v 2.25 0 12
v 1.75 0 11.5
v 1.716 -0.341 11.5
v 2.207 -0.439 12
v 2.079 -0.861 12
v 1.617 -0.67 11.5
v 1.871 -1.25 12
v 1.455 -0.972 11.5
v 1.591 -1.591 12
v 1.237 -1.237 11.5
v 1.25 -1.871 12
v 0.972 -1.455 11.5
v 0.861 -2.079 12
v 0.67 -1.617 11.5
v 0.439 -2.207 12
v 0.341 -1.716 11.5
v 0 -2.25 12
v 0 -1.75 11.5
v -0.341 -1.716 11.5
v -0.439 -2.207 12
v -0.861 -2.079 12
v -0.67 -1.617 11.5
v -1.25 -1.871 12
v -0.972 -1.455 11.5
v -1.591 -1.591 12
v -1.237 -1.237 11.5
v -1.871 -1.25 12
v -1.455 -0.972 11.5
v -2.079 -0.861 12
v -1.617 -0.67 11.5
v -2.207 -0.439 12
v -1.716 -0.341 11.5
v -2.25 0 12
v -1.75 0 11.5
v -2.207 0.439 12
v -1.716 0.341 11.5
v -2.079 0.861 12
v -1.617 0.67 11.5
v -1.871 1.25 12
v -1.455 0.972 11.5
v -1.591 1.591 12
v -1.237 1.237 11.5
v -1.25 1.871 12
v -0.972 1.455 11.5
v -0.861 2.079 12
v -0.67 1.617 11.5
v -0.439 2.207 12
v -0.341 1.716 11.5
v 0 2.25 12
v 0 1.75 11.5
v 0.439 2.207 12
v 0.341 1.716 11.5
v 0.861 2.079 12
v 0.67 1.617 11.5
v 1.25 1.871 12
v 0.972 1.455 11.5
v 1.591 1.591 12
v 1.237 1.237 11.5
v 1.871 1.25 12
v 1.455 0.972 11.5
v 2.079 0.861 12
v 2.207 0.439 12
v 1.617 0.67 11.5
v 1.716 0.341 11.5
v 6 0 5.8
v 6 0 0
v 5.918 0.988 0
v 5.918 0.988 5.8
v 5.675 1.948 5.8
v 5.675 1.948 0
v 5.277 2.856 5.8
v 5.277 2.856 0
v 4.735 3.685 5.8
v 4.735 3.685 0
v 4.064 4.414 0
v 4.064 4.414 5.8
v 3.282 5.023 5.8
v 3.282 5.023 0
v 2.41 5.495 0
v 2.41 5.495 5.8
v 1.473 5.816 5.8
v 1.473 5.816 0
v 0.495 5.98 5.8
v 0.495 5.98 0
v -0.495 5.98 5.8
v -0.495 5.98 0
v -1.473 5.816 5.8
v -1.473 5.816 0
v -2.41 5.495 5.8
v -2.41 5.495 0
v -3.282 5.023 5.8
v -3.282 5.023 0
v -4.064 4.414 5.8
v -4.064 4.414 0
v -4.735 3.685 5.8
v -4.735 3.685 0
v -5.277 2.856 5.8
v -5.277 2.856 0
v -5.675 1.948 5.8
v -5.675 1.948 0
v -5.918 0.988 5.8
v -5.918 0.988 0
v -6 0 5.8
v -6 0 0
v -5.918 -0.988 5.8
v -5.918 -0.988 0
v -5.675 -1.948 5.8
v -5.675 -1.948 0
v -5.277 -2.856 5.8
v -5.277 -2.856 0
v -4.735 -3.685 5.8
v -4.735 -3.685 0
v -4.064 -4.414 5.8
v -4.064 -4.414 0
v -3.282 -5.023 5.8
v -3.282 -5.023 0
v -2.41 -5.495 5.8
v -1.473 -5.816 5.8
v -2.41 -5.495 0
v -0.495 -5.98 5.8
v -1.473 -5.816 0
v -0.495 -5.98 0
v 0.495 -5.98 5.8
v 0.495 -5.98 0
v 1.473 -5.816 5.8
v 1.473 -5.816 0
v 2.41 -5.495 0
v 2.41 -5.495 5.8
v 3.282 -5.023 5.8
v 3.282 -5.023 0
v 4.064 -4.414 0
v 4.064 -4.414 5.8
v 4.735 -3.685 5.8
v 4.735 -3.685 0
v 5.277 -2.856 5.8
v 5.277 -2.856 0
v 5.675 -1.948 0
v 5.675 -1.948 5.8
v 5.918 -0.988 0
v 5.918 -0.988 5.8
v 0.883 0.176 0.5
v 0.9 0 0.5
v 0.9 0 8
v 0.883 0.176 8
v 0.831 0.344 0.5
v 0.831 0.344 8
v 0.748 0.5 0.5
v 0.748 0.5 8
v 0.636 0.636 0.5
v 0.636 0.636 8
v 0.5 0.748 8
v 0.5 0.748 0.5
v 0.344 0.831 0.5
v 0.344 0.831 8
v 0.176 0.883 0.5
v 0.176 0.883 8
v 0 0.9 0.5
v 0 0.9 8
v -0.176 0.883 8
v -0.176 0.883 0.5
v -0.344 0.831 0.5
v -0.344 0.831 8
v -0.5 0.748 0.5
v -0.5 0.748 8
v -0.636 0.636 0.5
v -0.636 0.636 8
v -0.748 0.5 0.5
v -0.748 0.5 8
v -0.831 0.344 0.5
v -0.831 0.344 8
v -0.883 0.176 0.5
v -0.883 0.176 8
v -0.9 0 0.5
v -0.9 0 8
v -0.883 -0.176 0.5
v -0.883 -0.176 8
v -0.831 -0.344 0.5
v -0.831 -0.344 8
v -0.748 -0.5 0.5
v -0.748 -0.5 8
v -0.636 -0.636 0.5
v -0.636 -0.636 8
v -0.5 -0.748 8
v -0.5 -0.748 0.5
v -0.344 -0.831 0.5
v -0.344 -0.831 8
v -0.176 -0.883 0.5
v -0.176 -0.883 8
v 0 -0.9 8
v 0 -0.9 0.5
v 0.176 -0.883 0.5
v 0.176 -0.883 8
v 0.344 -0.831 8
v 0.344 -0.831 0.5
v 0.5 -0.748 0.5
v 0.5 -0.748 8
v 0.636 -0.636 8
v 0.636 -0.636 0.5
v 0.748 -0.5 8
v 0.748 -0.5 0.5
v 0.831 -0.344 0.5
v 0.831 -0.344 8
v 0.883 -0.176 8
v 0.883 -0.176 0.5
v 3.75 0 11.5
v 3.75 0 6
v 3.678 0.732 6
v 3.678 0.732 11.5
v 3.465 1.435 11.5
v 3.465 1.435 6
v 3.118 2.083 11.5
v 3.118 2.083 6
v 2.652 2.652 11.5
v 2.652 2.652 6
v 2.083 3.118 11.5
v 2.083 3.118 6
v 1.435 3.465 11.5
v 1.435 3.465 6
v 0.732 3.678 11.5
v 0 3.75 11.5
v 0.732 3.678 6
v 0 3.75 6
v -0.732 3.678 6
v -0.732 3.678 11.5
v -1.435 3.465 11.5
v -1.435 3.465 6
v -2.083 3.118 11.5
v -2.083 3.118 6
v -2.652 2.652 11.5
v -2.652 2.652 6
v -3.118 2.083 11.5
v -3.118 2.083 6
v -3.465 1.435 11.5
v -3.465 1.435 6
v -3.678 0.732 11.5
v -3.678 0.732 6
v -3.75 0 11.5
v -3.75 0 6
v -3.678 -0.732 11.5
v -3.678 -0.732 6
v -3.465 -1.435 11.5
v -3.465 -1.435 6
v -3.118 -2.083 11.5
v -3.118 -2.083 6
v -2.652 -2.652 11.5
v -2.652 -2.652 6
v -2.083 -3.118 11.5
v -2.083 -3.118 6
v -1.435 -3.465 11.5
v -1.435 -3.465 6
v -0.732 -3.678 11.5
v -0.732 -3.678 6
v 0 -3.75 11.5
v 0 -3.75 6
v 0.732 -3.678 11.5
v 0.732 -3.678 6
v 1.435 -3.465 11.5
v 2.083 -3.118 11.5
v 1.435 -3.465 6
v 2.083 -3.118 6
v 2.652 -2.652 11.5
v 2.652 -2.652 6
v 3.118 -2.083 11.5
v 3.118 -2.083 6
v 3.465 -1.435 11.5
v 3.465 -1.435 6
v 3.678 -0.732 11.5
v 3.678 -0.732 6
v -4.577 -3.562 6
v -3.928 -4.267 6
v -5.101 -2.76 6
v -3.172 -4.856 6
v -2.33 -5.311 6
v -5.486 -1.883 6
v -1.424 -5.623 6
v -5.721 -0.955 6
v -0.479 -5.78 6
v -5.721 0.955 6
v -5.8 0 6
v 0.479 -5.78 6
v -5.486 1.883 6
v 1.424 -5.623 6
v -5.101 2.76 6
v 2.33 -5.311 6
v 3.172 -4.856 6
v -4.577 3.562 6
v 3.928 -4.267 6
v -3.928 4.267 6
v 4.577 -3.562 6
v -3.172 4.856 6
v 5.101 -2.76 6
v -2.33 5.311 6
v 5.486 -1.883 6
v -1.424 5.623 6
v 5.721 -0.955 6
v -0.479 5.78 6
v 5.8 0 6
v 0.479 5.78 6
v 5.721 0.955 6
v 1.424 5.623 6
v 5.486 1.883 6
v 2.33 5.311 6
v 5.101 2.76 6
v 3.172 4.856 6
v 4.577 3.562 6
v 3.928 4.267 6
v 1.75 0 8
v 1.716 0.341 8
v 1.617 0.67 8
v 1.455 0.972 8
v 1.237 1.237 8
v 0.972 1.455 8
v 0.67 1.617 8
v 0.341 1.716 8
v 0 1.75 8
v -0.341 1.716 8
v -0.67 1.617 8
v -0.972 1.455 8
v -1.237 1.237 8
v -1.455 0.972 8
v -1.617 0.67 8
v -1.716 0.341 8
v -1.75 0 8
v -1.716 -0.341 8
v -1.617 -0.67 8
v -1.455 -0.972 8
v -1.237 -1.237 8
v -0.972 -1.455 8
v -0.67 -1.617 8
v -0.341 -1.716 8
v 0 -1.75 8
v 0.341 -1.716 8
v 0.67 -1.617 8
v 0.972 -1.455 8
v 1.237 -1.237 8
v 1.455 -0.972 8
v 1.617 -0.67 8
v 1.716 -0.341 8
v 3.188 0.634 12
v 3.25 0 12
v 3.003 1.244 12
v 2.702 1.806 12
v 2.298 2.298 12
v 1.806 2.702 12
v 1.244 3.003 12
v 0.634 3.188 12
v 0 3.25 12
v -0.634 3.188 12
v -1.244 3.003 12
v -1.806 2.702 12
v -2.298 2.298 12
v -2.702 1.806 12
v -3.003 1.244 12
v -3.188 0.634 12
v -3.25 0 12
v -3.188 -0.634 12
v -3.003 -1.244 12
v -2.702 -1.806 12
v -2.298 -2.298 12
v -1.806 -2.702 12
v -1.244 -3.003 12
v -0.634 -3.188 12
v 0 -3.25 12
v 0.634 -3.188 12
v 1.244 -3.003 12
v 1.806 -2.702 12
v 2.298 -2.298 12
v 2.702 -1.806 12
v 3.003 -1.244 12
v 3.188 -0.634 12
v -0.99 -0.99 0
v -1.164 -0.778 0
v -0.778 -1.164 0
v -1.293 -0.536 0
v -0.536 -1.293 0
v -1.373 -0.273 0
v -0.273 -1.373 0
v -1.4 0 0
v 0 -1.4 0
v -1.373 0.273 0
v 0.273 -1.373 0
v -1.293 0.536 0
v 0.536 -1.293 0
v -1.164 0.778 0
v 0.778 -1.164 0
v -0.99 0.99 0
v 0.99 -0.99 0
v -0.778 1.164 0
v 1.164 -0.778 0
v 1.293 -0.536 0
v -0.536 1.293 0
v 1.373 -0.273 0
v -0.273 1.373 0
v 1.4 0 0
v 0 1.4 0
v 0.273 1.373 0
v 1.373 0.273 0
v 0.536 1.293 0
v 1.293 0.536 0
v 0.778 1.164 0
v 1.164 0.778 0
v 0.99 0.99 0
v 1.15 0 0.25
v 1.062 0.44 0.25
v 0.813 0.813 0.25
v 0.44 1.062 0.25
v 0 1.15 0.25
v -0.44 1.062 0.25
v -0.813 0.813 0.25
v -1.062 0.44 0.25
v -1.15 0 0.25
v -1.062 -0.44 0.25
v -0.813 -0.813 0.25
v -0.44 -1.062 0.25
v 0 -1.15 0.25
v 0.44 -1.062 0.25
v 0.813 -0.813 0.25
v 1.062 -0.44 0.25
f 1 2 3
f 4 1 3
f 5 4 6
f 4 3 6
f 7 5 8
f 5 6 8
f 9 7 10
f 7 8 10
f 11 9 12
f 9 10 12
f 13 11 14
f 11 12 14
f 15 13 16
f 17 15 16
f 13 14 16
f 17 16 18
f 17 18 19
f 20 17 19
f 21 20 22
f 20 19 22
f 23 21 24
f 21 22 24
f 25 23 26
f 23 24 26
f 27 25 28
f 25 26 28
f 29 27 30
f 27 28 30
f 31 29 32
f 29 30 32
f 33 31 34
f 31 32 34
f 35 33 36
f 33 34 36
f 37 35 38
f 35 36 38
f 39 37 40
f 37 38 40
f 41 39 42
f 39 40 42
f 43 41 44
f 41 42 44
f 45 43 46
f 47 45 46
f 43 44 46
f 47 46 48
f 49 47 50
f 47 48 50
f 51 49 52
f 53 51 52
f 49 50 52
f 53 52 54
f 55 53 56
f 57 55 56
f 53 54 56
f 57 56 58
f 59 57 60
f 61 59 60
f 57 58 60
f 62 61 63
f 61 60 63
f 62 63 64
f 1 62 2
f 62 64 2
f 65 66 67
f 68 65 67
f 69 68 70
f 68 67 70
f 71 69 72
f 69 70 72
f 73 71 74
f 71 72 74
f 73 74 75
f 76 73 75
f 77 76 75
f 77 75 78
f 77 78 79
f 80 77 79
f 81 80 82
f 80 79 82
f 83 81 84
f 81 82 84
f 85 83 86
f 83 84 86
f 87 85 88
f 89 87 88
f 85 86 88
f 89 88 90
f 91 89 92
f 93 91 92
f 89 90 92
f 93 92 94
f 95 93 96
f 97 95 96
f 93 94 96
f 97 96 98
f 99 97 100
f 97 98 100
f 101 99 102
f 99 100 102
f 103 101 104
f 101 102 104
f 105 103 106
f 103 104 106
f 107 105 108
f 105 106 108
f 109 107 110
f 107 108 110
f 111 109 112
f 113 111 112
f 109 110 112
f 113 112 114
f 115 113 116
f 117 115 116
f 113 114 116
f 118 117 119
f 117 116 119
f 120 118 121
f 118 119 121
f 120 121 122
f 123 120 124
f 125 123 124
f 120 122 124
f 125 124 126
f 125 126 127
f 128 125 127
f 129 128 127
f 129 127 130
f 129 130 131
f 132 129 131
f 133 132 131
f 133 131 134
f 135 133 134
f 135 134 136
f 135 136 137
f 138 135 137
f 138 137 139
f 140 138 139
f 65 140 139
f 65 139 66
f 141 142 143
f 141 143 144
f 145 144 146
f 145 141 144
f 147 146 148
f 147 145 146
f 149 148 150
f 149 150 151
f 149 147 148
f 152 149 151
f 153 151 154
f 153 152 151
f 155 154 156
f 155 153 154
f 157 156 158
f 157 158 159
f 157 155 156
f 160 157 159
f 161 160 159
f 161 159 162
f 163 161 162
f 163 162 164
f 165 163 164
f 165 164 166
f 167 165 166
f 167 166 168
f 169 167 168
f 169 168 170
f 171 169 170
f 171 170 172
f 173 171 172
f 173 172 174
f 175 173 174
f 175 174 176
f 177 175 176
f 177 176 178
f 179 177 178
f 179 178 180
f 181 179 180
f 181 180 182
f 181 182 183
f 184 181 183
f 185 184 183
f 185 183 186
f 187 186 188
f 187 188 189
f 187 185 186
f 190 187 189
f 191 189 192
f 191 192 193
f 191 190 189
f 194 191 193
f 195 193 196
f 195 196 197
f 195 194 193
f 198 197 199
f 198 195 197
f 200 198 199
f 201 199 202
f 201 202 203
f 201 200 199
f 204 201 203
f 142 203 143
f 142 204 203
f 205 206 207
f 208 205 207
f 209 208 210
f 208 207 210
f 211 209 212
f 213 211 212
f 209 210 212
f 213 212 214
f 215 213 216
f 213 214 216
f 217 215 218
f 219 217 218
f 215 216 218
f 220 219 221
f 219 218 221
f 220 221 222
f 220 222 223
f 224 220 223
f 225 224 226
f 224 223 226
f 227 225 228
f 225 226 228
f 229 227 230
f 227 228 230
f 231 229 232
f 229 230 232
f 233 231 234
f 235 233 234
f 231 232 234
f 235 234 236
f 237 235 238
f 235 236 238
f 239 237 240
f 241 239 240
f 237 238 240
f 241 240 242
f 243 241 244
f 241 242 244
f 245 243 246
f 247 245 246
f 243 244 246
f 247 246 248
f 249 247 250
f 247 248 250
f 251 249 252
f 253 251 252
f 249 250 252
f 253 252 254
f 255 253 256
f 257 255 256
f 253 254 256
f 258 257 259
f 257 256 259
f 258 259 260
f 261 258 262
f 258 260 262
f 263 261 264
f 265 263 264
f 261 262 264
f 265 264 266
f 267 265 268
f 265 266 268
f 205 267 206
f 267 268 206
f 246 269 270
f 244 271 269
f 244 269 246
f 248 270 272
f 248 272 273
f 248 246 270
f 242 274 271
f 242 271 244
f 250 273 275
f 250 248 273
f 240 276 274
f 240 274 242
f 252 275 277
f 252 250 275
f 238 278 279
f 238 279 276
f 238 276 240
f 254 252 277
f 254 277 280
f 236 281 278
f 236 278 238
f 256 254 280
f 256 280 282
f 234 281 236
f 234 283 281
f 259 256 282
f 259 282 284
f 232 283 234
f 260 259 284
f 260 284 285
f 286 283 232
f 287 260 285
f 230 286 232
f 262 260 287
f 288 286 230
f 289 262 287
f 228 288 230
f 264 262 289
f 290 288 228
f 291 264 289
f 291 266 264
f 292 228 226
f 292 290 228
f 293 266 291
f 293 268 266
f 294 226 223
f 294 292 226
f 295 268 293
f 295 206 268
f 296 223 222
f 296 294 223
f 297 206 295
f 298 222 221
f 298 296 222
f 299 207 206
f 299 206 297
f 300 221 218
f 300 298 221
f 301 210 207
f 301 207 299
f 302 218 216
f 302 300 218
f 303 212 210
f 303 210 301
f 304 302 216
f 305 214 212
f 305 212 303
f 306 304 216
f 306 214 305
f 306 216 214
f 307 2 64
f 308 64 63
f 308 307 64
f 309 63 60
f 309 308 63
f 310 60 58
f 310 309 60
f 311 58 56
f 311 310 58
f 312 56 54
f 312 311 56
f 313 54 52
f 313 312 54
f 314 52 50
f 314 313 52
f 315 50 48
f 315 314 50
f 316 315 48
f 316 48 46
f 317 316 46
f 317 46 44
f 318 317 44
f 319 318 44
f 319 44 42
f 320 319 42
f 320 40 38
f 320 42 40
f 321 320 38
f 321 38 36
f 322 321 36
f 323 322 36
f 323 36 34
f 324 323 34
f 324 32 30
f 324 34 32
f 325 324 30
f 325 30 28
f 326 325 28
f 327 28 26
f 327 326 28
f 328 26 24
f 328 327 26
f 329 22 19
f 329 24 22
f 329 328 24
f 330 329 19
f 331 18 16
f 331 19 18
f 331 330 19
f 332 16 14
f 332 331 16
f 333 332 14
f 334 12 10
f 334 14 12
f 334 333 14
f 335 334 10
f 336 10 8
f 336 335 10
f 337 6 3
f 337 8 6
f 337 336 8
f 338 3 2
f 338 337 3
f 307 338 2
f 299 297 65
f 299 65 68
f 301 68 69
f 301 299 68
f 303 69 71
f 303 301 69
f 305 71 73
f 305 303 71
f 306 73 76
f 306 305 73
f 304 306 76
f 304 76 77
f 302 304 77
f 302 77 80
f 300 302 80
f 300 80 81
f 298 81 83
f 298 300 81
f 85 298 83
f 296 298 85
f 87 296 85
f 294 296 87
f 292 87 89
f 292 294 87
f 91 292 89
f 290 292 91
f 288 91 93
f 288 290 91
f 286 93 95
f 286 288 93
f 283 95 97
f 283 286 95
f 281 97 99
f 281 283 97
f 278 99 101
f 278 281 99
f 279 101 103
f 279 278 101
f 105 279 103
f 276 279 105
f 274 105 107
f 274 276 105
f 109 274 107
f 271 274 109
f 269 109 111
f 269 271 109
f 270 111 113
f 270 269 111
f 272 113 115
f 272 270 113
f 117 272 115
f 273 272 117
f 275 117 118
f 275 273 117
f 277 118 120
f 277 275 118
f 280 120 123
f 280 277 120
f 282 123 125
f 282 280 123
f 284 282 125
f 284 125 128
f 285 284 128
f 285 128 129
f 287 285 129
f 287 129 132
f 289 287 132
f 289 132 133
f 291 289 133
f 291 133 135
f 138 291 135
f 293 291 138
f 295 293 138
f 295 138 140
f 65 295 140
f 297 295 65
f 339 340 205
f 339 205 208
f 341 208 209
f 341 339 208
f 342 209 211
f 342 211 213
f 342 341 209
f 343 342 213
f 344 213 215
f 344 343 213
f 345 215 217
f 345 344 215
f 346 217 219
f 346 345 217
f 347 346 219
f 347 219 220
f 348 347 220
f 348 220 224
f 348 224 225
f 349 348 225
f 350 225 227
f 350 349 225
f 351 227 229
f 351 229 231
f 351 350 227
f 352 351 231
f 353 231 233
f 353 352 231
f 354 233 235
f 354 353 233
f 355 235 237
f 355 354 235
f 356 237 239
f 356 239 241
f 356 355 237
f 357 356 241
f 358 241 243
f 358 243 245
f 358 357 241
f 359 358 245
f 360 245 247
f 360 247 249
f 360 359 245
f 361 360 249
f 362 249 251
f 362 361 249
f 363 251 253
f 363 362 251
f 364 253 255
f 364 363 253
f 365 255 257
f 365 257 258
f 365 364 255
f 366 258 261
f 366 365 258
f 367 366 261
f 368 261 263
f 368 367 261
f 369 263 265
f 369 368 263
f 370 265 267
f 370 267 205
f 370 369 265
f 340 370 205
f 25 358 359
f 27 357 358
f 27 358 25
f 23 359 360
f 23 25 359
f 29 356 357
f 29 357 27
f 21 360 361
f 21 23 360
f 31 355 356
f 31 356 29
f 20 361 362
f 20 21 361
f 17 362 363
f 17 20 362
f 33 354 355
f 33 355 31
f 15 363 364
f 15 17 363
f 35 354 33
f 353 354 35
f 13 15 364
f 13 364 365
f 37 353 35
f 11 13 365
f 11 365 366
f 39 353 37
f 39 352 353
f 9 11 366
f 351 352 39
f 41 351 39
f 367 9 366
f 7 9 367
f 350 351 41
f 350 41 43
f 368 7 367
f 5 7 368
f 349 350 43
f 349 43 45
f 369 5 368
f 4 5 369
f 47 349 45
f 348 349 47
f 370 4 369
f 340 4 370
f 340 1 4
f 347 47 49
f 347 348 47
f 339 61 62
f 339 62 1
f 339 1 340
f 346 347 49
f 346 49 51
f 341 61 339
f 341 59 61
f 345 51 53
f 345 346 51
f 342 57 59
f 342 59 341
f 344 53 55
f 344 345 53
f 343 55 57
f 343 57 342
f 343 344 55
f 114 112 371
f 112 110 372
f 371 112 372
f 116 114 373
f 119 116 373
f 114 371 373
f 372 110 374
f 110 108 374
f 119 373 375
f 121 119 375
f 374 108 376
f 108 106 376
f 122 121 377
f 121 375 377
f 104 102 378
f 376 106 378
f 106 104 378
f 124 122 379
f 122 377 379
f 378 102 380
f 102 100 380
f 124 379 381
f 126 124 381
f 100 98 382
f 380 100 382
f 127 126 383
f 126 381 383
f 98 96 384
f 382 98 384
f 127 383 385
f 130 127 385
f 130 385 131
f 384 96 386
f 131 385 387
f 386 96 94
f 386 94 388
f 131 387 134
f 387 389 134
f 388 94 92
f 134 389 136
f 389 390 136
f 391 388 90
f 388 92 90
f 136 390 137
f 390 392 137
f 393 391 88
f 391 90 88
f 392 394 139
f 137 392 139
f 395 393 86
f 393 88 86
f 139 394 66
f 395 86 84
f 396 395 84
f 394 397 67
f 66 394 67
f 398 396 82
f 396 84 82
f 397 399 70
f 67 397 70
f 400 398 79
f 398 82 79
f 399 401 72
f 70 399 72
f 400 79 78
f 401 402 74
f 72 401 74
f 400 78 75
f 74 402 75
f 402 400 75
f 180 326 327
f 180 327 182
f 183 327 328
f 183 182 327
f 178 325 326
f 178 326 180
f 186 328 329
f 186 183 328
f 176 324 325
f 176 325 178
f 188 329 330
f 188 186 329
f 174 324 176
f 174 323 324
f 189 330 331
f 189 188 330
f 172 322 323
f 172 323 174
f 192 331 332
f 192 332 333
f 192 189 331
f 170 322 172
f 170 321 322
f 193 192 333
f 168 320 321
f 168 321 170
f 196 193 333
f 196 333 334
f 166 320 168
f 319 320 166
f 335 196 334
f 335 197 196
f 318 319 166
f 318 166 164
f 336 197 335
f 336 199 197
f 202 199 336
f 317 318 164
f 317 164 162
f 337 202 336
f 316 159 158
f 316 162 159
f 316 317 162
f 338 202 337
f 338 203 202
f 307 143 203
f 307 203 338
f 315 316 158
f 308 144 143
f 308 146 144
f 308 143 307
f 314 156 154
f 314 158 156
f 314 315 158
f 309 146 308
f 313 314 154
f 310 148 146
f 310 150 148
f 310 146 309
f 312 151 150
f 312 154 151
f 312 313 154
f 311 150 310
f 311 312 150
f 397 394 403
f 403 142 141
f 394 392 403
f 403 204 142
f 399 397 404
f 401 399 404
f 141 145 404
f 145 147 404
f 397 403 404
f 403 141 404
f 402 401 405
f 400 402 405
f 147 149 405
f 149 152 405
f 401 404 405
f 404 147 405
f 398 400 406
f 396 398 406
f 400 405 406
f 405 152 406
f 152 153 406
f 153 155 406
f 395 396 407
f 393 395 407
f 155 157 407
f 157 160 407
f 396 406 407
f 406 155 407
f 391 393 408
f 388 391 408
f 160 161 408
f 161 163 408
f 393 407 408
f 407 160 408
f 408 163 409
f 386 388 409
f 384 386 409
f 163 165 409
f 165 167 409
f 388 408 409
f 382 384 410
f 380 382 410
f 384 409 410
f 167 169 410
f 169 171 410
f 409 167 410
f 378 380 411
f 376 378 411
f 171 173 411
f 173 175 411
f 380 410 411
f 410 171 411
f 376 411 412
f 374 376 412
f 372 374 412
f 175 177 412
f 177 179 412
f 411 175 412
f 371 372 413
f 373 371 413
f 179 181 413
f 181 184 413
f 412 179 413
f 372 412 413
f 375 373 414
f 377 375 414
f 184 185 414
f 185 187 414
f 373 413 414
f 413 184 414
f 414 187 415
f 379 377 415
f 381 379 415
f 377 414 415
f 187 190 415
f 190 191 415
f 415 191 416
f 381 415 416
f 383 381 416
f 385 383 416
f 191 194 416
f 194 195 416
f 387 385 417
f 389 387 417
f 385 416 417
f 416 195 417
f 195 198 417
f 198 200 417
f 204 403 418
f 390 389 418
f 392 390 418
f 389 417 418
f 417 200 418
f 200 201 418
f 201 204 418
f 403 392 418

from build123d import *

# Parameters (mm, degrees)
F0_R        = 3.75
F0_R_2      = 1.75
F0_R_3      = 0.9
F1_DEPTH    = 6
F0_R_4      = 6
F1_FACE_R   = 3.75
F1_FACE_R_2 = 0.9
F2_DEPTH    = 6
F3_START    = 8
F3_DEPTH    = 6
F4_SIZE     = 0.5
F5_SIZE     = 0.2
F6_SIZE     = 0.5


with BuildPart() as f1:
    # F0 (on Top) → F1 (new body)
    with BuildSketch(Plane.XY):
        Circle(F0_R)
        Circle(F0_R_2, mode=Mode.SUBTRACT)
        Circle(F0_R_2)
        Circle(F0_R_3, mode=Mode.SUBTRACT)
    extrude(amount=F1_DEPTH)

    # F0 (on Top) + F1_face (on face) → F2 (join)
    with BuildSketch(Plane.XY):
        Circle(F0_R_4)
        Circle(F0_R, mode=Mode.SUBTRACT)
    with BuildSketch(Plane.XY.offset(6)):
        Circle(F1_FACE_R)
        Circle(F1_FACE_R_2, mode=Mode.SUBTRACT)
    extrude(amount=F2_DEPTH)

    # F0 (on Top) → F3 (cut)
    with BuildSketch(Plane.XY.offset(F3_START)):
        Circle(F0_R_2)
        Circle(F0_R_3, mode=Mode.SUBTRACT)
    extrude(amount=F3_DEPTH, mode=Mode.SUBTRACT)

    # F4
    f4_edges = [f1.edges().sort_by_distance(p)[0] for p in [
        (-0.9, 0, 0),
    ]]
    chamfer(f4_edges, length=F4_SIZE)

    # F5
    f5_edges = [f1.edges().sort_by_distance(p)[0] for p in [
        (-6, 0, 6),
    ]]
    chamfer(f5_edges, length=F5_SIZE)

    # F6
    f6_edges = [f1.edges().sort_by_distance(p)[0] for p in [
        (-3.75, 0, 12),
        (-1.75, 0, 12),
    ]]
    chamfer(f6_edges, length=F6_SIZE)


solid = f1.part
